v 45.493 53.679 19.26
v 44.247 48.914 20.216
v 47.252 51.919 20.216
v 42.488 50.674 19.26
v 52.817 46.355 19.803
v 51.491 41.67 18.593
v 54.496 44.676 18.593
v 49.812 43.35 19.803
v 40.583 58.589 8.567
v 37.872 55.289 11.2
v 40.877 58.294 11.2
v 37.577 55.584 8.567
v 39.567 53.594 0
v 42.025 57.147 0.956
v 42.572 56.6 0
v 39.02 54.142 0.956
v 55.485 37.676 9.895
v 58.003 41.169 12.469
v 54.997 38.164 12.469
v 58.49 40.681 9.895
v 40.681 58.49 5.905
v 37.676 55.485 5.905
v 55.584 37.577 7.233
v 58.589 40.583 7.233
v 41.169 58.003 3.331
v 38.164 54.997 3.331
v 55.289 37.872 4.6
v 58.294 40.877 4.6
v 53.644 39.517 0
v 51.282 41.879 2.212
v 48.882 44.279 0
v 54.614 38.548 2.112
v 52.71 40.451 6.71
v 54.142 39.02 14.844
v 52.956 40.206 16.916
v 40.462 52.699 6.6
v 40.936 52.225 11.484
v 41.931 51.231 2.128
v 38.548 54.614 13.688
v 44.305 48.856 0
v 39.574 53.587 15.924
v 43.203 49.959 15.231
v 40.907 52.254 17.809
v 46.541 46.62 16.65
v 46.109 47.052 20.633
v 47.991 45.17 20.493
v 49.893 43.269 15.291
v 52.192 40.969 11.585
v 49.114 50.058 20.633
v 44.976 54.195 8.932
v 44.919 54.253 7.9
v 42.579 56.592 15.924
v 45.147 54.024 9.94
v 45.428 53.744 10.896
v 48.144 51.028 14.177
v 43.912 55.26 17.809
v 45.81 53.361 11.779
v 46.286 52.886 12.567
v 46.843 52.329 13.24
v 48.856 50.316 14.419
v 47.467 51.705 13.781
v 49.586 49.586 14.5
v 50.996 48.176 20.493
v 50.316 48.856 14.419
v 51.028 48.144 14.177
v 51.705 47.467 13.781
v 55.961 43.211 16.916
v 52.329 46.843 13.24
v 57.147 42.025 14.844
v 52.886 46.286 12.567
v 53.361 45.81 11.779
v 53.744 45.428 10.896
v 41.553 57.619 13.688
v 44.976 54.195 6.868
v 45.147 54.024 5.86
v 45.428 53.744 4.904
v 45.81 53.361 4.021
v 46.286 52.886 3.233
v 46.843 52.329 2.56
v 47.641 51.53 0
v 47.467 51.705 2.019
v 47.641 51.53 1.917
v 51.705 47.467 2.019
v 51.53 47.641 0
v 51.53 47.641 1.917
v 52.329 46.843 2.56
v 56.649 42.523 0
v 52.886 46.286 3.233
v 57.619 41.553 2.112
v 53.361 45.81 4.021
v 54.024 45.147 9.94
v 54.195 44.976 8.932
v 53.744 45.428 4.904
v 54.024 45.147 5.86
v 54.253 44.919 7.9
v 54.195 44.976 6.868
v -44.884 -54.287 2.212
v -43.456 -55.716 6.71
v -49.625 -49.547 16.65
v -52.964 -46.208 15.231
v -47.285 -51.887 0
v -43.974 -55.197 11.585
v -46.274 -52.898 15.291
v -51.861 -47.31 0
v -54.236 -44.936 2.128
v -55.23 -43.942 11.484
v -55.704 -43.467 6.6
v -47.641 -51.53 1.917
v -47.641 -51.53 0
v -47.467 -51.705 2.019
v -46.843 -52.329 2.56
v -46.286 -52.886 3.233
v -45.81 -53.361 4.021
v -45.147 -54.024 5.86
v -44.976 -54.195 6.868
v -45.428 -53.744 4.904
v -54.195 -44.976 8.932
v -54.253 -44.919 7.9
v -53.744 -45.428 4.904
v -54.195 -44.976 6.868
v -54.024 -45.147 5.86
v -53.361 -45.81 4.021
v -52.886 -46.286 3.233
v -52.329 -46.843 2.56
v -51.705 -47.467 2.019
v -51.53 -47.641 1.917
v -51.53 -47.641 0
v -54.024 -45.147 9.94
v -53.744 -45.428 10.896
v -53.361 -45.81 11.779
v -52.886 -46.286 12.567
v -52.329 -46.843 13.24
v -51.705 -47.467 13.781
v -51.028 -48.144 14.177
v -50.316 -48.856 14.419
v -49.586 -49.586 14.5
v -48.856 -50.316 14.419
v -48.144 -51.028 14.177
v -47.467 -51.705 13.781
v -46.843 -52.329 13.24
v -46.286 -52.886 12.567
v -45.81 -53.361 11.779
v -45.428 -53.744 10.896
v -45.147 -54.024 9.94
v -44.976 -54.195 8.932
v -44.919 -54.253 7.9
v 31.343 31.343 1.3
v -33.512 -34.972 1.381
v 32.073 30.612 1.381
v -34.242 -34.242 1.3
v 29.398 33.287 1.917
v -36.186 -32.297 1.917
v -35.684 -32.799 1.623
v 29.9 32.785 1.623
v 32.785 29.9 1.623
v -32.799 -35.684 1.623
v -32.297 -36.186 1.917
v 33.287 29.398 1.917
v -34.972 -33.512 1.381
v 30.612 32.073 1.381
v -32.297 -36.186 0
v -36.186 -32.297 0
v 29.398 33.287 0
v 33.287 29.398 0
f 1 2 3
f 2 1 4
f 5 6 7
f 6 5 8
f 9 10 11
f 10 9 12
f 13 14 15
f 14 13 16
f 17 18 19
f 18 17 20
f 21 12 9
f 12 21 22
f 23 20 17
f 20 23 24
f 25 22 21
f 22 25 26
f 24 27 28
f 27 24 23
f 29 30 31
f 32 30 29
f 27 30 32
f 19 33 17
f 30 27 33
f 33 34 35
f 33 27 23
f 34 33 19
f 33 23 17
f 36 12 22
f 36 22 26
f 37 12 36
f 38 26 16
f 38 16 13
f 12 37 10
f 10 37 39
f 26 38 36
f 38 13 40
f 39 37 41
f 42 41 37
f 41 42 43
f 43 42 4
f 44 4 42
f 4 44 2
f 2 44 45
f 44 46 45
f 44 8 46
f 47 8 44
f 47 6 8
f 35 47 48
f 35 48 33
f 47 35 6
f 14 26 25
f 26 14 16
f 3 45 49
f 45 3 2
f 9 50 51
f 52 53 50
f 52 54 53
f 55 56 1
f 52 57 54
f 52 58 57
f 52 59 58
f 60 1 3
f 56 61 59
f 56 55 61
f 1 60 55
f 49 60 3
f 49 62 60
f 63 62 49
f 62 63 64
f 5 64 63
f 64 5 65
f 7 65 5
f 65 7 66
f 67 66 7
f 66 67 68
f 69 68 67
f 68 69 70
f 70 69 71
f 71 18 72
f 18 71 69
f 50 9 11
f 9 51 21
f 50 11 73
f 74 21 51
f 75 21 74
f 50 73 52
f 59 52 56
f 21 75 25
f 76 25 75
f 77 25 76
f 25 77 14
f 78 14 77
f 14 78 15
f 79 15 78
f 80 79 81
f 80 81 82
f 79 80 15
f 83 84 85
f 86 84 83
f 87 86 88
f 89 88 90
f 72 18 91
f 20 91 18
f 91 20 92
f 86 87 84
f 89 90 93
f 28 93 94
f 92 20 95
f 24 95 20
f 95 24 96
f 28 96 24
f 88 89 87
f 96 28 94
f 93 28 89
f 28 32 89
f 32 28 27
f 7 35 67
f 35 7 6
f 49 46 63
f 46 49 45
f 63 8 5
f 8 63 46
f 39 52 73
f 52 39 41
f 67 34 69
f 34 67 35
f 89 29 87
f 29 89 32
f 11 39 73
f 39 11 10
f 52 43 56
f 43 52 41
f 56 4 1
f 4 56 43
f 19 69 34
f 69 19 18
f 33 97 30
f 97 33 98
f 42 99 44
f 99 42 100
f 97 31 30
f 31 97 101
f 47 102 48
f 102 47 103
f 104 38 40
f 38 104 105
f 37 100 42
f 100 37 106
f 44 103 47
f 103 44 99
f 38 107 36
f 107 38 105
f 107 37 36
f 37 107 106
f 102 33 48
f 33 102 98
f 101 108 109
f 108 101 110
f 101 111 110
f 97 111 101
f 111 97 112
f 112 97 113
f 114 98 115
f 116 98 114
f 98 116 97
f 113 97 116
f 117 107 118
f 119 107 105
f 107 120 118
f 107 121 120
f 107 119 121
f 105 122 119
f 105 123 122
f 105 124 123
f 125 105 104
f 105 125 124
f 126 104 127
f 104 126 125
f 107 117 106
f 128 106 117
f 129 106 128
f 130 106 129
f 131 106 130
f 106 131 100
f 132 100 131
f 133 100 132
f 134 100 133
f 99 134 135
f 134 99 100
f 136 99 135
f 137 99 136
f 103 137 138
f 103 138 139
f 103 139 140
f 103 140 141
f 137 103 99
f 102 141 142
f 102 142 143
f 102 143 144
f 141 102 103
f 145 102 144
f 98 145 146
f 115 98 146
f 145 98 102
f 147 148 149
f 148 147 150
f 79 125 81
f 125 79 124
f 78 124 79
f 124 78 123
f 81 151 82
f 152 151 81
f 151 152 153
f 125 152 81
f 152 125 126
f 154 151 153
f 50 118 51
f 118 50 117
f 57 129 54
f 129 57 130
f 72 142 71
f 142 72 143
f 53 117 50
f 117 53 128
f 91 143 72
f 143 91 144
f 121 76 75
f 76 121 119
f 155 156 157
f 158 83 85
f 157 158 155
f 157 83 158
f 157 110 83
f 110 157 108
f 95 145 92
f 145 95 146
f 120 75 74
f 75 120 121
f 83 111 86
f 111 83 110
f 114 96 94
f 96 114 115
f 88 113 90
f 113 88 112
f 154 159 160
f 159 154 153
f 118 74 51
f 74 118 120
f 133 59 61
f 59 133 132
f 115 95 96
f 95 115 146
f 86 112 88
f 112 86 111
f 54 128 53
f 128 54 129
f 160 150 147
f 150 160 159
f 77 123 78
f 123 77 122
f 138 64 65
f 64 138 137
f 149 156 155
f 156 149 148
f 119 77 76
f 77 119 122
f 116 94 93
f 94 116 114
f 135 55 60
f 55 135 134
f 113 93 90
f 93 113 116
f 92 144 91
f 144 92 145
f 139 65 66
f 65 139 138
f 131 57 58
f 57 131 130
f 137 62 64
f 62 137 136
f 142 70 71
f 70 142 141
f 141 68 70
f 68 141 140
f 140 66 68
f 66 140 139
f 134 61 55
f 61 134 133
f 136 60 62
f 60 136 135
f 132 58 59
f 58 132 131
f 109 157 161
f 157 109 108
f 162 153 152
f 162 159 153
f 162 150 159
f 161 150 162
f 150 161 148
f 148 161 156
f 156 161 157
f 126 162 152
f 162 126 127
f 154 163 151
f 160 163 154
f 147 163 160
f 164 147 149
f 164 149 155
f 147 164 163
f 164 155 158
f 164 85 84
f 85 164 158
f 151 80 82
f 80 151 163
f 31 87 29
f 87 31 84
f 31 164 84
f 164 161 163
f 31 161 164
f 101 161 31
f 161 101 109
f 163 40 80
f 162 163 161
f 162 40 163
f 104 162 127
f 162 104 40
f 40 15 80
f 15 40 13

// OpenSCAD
light_blue = [0.30, 0.45, 0.90, 0.85];
light_green = [0.30, 0.95, 0.40, 0.85];
//arm_o_dia = 17.5;
arm_o_dia = 17.5;
arm_i_dia = 13.1;
arm_h     = 140.25;
spacing   = 5;
notch_l = 21.7;
connecting_notch_l = 17;
smudge = 0.1;


//different arm geometries
// cylinder 
//arm_o_face = 30;   //use 30 for cylinder, 6 for hexagon
//arm_o_rot  = 0;  //use 19 for 7 sides (septagon), use 15 for 6
//lay_flat_on_bed = -0.5;  //might be needed for different sided arms

// septagon 
arm_o_face = 11;   //use 30 for cylinder, 6 for hexagon
arm_o_rot  = 29.0;  //use 19 for 7 sides (septagon), use 15 for 6
lay_flat_on_bed = -0.85;  //might be needed for different sided arms

// octagon 
//arm_o_face = 8;   //use 30 for cylinder, 6 for hexagon
//arm_o_rot  = 22.5;  //use 19 for 7 sides (septagon), use 15 for 6
//lay_flat_on_bed = -0.90;  //might be needed for different sided arms

// heptagon
//arm_o_face = 7;   //use 30 for cylinder, 6 for hexagon
//arm_o_rot  = 19;  //use 19 for 7 sides (septagon), use 15 for 6
//lay_flat_on_bed = -0.9;  //might be needed for different sided arms

// hexagon
//arm_o_face = 6;   //use 30 for cylinder, 6 for hexagon
//arm_o_rot  = 15;  //use 19 for 7 sides (septagon), use 15 for 6
//lay_flat_on_bed = -1.25;  //might be needed for different sided arms

//arm A
//  translate and rotate for show
//  translate( [ 16.25, 0, arm_h - notch_l + 4])
//  rotate([ 0, 180, -90])
//  translate(-[ -(arm_o_dia/2) - (spacing/2), 0, 0] )


/*
color( light_green )
translate([ -(arm_o_dia/2) - (spacing/2), 0, 0] )
arm_with_tab(arm_o_dia, arm_i_dia, arm_h/2, 0);
*/


//arm B

/*
color( light_blue )
translate([ (arm_o_dia/2) + (spacing/2) + 5, 0, 0] )
arm_with_notches(arm_o_dia, arm_i_dia, arm_h/2, notch_l, connecting_notch_l, 1);
*/

//arm A+B in one
color( light_blue )

rotate([ 0, 0, -45] )
translate([ 0, arm_h/2, 0] )
difference() {
	translate([ 0, 0, (arm_o_dia/2 ) + lay_flat_on_bed] )
	rotate([ 90, 0, 0 ])
	rotate([ 0, 0, -135 ])
	arm_with_notches(arm_o_dia, arm_i_dia, arm_h, notch_l, notch_l, 1);

	translate([ 0, -arm_h/2, -arm_o_dia/4 ])
	cube( [arm_h/4, arm_h, arm_o_dia/2], true);
}


module arm_bare(od, id, h, faces=0) {
	difference() {
	rotate([ 0, 0, arm_o_rot])
	if (faces == 0) {
		cylinder(r=od/2, h=h, $fn=arm_o_face);
	} else {
		cylinder(r=od/2, h=h, $fn=faces);
	}
	translate ([ 0, 0, -1])
	cylinder(r=id/2, h=h+2, $fn=40);
	}
}

module arm_base_ring(od, id, h) {
	difference() {
	cylinder(r=od/2, h=h, $fn=30);
	translate ([ 0, 0, -1])
	rotate([ 0, 0, arm_o_rot])
	cylinder(r=id/2, h=h+2, $fn=arm_o_face);
	}
}


module arm_with_notches(od, id, h, notch1, notch2, ring=0) {


	difference() {
		union() {
		if (ring) {
			arm_base_ring( 25.5, od -0.2, 4.25);
		}
		arm_bare(od, id + smudge, h);
		}

		bottom_notch( notch2 , h-notch2);

		bottom_notch( notch1 + 4);

	}

}

module arm_with_tab(od, id, h, ring=0) {

	trans_l = 4;

	difference() {
		color([ .20, .30, .80, .70])
		union() {
		if (ring) {
			arm_base_ring( 25.5, od -0.2, 4.25);
		}

		arm_bare(od, id, h );

		translate( [0, 0, h ] )
		arm_bare(id - smudge , id-3, connecting_notch_l, 40);

		translate( [0, 0, h  - trans_l ] )
		difference() {
		cylinder(r1=(od-0.4)/2, r2=od/2, h=trans_l, $fn=20);
		translate( [0, 0, -0.1] )
		cylinder(r1=(od-0.4)/2, r2=(id-3)/2, h=trans_l+0.2, $fn=20);
		}
		}

		bottom_notch( notch_l + 4);
	}

		bottom_tab( connecting_notch_l , (h));
}

module bottom_tab(l, offset=0) {

	rotate([ 0, 0, 45])
	intersection() {
	translate([ 5.5, -2.75,  offset])
		cube( [ 3.3, 5.5, l  + 0.1] );
	translate([ 0, 0,  offset])
		cylinder( r=arm_o_dia/2, h=l, $fn=40);
	}
}

module bottom_notch(l, offset=0) {

	rotate([ 0, 0, 45])
	translate([ 5.5, -2.75,  offset])
	cube( [ 9, 5.5, l  + 0.1] );
}


//show_orig();

module show_orig() {
	color([ 0.85, 0.40, 0.45, 0.25])
	import(file="PL2Q_Hugin_arm_no_base_raft.stl");
}
